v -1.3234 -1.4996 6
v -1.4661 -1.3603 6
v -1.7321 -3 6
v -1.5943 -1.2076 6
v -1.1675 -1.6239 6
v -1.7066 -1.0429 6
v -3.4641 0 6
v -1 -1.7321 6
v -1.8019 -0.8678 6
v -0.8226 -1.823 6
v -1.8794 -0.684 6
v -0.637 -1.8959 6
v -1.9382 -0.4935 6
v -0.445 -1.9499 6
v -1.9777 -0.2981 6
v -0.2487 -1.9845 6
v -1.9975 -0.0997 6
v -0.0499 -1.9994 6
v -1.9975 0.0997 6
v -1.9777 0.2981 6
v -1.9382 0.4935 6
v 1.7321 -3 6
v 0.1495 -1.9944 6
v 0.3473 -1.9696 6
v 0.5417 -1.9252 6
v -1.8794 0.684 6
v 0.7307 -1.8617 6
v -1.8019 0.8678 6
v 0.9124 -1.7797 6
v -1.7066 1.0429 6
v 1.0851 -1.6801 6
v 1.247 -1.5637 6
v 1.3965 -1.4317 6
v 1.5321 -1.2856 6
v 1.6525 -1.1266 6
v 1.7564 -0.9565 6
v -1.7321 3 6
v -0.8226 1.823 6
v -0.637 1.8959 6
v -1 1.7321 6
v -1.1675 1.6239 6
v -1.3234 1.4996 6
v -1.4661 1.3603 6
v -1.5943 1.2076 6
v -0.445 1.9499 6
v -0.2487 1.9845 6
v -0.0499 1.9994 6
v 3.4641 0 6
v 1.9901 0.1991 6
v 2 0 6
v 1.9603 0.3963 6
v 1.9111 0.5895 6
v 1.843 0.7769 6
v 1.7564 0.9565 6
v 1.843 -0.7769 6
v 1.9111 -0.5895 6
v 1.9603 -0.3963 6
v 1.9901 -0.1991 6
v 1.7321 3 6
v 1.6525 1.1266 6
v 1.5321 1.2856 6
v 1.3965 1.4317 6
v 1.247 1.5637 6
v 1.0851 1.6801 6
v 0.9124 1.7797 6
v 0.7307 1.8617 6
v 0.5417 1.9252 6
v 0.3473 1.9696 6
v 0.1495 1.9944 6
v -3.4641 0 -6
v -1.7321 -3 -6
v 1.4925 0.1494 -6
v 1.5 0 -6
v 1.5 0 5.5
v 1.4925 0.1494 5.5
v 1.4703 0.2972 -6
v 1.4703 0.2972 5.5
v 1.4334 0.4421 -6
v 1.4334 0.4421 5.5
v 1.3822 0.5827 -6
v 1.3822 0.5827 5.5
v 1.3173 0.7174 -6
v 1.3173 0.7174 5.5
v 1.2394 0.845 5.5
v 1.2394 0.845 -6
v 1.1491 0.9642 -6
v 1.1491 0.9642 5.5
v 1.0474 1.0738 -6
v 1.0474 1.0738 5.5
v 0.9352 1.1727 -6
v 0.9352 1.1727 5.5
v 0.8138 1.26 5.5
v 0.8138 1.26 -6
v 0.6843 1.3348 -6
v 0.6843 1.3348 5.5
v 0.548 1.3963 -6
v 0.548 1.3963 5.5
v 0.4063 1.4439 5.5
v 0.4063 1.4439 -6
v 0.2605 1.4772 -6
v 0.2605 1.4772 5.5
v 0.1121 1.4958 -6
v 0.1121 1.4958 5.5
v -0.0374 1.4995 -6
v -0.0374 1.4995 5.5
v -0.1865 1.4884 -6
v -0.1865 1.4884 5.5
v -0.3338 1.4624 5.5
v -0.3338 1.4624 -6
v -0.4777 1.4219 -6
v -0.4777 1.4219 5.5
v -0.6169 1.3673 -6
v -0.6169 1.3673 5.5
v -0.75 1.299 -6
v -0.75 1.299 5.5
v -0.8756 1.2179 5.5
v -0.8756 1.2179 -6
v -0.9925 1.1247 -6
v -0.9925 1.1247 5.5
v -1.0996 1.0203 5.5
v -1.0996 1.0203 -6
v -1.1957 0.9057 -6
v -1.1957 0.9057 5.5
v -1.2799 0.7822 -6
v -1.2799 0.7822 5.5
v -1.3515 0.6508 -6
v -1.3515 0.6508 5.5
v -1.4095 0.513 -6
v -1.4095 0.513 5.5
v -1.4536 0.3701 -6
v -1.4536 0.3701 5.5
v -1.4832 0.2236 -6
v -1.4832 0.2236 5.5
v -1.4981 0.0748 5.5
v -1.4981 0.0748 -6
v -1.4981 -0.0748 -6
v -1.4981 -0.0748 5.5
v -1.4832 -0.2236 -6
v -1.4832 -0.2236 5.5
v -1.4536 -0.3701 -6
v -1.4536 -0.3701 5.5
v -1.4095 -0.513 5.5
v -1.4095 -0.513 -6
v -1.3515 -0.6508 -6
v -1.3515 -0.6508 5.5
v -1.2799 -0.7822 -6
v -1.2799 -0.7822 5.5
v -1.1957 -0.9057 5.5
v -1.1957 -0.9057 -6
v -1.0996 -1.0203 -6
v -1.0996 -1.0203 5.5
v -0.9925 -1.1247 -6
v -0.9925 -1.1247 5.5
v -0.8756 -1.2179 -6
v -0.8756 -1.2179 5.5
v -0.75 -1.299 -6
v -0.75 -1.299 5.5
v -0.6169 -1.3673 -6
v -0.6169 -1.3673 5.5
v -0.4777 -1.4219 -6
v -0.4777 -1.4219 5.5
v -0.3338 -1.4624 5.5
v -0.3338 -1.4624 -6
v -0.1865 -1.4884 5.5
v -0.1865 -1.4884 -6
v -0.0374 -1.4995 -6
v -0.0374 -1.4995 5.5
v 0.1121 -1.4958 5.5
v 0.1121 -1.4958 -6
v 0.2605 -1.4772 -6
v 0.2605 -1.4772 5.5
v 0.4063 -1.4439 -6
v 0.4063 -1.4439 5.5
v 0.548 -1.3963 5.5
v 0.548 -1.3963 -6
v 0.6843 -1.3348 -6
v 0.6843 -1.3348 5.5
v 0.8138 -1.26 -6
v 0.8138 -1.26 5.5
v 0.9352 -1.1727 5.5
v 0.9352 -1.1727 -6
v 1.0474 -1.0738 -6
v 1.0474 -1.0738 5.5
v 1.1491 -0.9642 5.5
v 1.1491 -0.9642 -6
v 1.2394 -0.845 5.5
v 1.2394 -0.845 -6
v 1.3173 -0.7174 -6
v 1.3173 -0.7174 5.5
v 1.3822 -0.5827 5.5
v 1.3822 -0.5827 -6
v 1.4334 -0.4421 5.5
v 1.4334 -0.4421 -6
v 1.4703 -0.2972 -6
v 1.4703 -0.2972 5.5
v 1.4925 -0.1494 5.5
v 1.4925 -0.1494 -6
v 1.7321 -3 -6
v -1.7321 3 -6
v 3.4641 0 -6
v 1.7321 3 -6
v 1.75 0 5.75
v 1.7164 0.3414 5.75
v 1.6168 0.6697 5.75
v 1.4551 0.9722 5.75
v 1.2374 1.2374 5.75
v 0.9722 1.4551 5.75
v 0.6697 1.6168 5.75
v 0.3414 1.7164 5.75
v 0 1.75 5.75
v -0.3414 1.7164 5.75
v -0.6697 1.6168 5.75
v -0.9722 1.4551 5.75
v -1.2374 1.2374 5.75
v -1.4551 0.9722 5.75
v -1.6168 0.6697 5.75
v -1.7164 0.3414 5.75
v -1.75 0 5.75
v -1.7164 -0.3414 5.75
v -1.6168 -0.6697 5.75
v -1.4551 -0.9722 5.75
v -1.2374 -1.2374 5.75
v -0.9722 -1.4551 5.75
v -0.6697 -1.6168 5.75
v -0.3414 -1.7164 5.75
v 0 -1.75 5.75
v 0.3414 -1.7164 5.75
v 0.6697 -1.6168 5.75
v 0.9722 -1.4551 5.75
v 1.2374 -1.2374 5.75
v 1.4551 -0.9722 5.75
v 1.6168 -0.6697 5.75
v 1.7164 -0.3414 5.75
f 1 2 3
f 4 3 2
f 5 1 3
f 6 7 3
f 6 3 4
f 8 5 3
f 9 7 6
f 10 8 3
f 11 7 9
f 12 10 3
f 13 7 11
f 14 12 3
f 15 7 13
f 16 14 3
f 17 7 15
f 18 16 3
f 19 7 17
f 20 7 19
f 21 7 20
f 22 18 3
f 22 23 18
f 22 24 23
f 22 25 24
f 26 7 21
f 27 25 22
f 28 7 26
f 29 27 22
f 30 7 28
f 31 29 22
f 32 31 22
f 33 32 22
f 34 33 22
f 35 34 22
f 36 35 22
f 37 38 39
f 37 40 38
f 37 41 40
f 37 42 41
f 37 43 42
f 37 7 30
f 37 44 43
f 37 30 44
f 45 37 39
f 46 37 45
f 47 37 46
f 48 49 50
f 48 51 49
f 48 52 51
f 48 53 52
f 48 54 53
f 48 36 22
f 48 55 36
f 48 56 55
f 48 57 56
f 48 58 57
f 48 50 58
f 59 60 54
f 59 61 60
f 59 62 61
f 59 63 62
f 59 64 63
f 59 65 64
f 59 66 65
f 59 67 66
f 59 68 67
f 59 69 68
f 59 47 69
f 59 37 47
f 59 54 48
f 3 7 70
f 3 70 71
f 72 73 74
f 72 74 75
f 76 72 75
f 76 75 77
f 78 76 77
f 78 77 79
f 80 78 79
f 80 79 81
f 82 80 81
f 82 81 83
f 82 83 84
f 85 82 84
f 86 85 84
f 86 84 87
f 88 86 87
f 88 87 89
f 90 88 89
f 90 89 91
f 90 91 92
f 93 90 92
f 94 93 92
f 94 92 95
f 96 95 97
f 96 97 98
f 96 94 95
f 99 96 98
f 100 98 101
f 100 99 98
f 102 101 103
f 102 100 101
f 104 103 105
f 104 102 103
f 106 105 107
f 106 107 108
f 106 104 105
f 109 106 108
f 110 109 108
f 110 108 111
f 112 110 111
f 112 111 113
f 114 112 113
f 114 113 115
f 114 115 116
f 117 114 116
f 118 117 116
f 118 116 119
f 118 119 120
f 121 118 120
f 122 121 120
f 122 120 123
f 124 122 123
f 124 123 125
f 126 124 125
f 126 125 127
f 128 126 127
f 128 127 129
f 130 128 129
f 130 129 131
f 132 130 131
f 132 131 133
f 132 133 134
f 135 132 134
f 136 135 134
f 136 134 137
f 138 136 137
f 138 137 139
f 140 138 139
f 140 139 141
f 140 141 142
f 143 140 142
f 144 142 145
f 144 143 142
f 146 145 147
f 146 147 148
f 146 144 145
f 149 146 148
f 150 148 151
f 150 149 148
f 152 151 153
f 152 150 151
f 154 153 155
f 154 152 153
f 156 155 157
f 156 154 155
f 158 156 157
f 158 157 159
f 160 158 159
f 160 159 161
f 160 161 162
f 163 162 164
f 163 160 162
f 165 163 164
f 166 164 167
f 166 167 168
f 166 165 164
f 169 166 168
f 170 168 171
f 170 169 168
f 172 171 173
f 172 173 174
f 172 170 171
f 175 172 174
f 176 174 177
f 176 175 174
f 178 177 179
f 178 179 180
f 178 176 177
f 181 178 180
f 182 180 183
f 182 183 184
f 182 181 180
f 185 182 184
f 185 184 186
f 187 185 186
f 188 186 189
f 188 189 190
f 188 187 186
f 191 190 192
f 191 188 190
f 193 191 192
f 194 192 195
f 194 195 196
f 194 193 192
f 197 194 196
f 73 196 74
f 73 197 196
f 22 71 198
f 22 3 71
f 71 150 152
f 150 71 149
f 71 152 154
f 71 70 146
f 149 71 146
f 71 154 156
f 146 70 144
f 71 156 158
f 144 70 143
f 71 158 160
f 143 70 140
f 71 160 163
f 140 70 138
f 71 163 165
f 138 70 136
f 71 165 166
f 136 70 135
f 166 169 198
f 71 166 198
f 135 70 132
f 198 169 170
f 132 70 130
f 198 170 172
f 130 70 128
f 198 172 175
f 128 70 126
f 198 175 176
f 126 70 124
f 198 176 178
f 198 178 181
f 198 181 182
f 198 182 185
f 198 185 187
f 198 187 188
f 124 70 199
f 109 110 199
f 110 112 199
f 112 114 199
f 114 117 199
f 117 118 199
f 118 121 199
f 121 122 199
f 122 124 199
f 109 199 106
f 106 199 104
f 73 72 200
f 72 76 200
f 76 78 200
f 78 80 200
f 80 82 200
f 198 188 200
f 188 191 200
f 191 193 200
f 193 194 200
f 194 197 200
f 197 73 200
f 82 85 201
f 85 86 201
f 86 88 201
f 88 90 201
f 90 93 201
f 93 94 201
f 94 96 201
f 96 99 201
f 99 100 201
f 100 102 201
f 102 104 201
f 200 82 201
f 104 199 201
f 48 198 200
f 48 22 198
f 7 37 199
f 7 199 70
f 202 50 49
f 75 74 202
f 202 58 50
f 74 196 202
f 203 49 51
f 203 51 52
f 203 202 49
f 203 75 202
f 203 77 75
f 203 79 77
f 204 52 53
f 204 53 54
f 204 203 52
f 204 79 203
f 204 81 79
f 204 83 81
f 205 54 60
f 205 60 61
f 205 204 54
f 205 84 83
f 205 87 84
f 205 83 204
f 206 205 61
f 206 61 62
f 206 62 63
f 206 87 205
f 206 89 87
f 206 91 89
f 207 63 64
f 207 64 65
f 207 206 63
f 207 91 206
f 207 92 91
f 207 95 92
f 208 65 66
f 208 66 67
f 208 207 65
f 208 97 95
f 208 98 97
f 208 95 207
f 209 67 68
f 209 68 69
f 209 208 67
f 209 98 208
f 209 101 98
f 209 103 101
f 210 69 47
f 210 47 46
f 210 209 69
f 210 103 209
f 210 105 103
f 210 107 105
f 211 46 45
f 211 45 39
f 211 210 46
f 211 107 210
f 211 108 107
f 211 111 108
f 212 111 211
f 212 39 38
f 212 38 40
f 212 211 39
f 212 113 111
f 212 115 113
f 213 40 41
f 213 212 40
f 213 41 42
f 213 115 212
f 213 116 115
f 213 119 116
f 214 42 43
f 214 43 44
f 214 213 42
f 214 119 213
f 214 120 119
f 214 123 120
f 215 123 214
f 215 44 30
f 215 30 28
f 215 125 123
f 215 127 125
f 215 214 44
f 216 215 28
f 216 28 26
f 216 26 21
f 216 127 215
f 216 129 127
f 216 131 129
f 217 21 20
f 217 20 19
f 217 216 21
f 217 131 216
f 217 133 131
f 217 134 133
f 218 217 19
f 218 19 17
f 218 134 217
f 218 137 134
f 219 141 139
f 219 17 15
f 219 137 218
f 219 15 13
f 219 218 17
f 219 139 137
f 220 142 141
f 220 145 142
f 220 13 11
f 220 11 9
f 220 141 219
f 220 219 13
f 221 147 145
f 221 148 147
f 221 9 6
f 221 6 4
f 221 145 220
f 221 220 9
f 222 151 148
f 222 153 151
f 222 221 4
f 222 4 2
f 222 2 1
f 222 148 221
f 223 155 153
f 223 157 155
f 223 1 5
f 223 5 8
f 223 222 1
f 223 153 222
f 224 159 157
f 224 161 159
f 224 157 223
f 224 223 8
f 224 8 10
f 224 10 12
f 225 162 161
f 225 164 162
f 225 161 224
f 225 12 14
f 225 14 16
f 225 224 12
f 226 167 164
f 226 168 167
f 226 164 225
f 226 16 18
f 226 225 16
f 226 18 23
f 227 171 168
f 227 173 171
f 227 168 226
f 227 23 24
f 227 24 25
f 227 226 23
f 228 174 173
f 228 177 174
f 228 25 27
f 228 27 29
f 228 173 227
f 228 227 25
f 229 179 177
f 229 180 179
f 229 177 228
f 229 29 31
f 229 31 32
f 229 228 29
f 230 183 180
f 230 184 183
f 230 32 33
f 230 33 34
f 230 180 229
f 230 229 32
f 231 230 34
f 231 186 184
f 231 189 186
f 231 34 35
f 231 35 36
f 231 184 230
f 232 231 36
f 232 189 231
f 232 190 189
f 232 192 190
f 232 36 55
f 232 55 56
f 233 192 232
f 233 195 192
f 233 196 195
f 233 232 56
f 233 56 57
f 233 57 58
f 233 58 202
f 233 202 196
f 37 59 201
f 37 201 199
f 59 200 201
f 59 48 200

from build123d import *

# Parameters (mm, degrees)
SKETCH1_R           = 1.5
BOSS_EXTRUDE1_DEPTH = 6
CHAMFER1_SIZE       = 0.5


with BuildPart() as part:
    # Sketch1 → Boss-Extrude1 (new, symmetric)
    with BuildSketch(Plane.XY):
        Polygon((3.464101615, 0), (1.732050808, 3), (-1.732050808, 3), (-3.464101615, 0), (-1.732050808, -3), (1.732050808, -3), align=None)
        Circle(SKETCH1_R, mode=Mode.SUBTRACT)
    extrude(amount=BOSS_EXTRUDE1_DEPTH, both=True)

    # Chamfer1
    chamfer1_edges = [part.edges().sort_by_distance(p)[0] for p in [
        (-1.5, 0, 6),
    ]]
    chamfer(chamfer1_edges, length=CHAMFER1_SIZE)


solid = part.part
